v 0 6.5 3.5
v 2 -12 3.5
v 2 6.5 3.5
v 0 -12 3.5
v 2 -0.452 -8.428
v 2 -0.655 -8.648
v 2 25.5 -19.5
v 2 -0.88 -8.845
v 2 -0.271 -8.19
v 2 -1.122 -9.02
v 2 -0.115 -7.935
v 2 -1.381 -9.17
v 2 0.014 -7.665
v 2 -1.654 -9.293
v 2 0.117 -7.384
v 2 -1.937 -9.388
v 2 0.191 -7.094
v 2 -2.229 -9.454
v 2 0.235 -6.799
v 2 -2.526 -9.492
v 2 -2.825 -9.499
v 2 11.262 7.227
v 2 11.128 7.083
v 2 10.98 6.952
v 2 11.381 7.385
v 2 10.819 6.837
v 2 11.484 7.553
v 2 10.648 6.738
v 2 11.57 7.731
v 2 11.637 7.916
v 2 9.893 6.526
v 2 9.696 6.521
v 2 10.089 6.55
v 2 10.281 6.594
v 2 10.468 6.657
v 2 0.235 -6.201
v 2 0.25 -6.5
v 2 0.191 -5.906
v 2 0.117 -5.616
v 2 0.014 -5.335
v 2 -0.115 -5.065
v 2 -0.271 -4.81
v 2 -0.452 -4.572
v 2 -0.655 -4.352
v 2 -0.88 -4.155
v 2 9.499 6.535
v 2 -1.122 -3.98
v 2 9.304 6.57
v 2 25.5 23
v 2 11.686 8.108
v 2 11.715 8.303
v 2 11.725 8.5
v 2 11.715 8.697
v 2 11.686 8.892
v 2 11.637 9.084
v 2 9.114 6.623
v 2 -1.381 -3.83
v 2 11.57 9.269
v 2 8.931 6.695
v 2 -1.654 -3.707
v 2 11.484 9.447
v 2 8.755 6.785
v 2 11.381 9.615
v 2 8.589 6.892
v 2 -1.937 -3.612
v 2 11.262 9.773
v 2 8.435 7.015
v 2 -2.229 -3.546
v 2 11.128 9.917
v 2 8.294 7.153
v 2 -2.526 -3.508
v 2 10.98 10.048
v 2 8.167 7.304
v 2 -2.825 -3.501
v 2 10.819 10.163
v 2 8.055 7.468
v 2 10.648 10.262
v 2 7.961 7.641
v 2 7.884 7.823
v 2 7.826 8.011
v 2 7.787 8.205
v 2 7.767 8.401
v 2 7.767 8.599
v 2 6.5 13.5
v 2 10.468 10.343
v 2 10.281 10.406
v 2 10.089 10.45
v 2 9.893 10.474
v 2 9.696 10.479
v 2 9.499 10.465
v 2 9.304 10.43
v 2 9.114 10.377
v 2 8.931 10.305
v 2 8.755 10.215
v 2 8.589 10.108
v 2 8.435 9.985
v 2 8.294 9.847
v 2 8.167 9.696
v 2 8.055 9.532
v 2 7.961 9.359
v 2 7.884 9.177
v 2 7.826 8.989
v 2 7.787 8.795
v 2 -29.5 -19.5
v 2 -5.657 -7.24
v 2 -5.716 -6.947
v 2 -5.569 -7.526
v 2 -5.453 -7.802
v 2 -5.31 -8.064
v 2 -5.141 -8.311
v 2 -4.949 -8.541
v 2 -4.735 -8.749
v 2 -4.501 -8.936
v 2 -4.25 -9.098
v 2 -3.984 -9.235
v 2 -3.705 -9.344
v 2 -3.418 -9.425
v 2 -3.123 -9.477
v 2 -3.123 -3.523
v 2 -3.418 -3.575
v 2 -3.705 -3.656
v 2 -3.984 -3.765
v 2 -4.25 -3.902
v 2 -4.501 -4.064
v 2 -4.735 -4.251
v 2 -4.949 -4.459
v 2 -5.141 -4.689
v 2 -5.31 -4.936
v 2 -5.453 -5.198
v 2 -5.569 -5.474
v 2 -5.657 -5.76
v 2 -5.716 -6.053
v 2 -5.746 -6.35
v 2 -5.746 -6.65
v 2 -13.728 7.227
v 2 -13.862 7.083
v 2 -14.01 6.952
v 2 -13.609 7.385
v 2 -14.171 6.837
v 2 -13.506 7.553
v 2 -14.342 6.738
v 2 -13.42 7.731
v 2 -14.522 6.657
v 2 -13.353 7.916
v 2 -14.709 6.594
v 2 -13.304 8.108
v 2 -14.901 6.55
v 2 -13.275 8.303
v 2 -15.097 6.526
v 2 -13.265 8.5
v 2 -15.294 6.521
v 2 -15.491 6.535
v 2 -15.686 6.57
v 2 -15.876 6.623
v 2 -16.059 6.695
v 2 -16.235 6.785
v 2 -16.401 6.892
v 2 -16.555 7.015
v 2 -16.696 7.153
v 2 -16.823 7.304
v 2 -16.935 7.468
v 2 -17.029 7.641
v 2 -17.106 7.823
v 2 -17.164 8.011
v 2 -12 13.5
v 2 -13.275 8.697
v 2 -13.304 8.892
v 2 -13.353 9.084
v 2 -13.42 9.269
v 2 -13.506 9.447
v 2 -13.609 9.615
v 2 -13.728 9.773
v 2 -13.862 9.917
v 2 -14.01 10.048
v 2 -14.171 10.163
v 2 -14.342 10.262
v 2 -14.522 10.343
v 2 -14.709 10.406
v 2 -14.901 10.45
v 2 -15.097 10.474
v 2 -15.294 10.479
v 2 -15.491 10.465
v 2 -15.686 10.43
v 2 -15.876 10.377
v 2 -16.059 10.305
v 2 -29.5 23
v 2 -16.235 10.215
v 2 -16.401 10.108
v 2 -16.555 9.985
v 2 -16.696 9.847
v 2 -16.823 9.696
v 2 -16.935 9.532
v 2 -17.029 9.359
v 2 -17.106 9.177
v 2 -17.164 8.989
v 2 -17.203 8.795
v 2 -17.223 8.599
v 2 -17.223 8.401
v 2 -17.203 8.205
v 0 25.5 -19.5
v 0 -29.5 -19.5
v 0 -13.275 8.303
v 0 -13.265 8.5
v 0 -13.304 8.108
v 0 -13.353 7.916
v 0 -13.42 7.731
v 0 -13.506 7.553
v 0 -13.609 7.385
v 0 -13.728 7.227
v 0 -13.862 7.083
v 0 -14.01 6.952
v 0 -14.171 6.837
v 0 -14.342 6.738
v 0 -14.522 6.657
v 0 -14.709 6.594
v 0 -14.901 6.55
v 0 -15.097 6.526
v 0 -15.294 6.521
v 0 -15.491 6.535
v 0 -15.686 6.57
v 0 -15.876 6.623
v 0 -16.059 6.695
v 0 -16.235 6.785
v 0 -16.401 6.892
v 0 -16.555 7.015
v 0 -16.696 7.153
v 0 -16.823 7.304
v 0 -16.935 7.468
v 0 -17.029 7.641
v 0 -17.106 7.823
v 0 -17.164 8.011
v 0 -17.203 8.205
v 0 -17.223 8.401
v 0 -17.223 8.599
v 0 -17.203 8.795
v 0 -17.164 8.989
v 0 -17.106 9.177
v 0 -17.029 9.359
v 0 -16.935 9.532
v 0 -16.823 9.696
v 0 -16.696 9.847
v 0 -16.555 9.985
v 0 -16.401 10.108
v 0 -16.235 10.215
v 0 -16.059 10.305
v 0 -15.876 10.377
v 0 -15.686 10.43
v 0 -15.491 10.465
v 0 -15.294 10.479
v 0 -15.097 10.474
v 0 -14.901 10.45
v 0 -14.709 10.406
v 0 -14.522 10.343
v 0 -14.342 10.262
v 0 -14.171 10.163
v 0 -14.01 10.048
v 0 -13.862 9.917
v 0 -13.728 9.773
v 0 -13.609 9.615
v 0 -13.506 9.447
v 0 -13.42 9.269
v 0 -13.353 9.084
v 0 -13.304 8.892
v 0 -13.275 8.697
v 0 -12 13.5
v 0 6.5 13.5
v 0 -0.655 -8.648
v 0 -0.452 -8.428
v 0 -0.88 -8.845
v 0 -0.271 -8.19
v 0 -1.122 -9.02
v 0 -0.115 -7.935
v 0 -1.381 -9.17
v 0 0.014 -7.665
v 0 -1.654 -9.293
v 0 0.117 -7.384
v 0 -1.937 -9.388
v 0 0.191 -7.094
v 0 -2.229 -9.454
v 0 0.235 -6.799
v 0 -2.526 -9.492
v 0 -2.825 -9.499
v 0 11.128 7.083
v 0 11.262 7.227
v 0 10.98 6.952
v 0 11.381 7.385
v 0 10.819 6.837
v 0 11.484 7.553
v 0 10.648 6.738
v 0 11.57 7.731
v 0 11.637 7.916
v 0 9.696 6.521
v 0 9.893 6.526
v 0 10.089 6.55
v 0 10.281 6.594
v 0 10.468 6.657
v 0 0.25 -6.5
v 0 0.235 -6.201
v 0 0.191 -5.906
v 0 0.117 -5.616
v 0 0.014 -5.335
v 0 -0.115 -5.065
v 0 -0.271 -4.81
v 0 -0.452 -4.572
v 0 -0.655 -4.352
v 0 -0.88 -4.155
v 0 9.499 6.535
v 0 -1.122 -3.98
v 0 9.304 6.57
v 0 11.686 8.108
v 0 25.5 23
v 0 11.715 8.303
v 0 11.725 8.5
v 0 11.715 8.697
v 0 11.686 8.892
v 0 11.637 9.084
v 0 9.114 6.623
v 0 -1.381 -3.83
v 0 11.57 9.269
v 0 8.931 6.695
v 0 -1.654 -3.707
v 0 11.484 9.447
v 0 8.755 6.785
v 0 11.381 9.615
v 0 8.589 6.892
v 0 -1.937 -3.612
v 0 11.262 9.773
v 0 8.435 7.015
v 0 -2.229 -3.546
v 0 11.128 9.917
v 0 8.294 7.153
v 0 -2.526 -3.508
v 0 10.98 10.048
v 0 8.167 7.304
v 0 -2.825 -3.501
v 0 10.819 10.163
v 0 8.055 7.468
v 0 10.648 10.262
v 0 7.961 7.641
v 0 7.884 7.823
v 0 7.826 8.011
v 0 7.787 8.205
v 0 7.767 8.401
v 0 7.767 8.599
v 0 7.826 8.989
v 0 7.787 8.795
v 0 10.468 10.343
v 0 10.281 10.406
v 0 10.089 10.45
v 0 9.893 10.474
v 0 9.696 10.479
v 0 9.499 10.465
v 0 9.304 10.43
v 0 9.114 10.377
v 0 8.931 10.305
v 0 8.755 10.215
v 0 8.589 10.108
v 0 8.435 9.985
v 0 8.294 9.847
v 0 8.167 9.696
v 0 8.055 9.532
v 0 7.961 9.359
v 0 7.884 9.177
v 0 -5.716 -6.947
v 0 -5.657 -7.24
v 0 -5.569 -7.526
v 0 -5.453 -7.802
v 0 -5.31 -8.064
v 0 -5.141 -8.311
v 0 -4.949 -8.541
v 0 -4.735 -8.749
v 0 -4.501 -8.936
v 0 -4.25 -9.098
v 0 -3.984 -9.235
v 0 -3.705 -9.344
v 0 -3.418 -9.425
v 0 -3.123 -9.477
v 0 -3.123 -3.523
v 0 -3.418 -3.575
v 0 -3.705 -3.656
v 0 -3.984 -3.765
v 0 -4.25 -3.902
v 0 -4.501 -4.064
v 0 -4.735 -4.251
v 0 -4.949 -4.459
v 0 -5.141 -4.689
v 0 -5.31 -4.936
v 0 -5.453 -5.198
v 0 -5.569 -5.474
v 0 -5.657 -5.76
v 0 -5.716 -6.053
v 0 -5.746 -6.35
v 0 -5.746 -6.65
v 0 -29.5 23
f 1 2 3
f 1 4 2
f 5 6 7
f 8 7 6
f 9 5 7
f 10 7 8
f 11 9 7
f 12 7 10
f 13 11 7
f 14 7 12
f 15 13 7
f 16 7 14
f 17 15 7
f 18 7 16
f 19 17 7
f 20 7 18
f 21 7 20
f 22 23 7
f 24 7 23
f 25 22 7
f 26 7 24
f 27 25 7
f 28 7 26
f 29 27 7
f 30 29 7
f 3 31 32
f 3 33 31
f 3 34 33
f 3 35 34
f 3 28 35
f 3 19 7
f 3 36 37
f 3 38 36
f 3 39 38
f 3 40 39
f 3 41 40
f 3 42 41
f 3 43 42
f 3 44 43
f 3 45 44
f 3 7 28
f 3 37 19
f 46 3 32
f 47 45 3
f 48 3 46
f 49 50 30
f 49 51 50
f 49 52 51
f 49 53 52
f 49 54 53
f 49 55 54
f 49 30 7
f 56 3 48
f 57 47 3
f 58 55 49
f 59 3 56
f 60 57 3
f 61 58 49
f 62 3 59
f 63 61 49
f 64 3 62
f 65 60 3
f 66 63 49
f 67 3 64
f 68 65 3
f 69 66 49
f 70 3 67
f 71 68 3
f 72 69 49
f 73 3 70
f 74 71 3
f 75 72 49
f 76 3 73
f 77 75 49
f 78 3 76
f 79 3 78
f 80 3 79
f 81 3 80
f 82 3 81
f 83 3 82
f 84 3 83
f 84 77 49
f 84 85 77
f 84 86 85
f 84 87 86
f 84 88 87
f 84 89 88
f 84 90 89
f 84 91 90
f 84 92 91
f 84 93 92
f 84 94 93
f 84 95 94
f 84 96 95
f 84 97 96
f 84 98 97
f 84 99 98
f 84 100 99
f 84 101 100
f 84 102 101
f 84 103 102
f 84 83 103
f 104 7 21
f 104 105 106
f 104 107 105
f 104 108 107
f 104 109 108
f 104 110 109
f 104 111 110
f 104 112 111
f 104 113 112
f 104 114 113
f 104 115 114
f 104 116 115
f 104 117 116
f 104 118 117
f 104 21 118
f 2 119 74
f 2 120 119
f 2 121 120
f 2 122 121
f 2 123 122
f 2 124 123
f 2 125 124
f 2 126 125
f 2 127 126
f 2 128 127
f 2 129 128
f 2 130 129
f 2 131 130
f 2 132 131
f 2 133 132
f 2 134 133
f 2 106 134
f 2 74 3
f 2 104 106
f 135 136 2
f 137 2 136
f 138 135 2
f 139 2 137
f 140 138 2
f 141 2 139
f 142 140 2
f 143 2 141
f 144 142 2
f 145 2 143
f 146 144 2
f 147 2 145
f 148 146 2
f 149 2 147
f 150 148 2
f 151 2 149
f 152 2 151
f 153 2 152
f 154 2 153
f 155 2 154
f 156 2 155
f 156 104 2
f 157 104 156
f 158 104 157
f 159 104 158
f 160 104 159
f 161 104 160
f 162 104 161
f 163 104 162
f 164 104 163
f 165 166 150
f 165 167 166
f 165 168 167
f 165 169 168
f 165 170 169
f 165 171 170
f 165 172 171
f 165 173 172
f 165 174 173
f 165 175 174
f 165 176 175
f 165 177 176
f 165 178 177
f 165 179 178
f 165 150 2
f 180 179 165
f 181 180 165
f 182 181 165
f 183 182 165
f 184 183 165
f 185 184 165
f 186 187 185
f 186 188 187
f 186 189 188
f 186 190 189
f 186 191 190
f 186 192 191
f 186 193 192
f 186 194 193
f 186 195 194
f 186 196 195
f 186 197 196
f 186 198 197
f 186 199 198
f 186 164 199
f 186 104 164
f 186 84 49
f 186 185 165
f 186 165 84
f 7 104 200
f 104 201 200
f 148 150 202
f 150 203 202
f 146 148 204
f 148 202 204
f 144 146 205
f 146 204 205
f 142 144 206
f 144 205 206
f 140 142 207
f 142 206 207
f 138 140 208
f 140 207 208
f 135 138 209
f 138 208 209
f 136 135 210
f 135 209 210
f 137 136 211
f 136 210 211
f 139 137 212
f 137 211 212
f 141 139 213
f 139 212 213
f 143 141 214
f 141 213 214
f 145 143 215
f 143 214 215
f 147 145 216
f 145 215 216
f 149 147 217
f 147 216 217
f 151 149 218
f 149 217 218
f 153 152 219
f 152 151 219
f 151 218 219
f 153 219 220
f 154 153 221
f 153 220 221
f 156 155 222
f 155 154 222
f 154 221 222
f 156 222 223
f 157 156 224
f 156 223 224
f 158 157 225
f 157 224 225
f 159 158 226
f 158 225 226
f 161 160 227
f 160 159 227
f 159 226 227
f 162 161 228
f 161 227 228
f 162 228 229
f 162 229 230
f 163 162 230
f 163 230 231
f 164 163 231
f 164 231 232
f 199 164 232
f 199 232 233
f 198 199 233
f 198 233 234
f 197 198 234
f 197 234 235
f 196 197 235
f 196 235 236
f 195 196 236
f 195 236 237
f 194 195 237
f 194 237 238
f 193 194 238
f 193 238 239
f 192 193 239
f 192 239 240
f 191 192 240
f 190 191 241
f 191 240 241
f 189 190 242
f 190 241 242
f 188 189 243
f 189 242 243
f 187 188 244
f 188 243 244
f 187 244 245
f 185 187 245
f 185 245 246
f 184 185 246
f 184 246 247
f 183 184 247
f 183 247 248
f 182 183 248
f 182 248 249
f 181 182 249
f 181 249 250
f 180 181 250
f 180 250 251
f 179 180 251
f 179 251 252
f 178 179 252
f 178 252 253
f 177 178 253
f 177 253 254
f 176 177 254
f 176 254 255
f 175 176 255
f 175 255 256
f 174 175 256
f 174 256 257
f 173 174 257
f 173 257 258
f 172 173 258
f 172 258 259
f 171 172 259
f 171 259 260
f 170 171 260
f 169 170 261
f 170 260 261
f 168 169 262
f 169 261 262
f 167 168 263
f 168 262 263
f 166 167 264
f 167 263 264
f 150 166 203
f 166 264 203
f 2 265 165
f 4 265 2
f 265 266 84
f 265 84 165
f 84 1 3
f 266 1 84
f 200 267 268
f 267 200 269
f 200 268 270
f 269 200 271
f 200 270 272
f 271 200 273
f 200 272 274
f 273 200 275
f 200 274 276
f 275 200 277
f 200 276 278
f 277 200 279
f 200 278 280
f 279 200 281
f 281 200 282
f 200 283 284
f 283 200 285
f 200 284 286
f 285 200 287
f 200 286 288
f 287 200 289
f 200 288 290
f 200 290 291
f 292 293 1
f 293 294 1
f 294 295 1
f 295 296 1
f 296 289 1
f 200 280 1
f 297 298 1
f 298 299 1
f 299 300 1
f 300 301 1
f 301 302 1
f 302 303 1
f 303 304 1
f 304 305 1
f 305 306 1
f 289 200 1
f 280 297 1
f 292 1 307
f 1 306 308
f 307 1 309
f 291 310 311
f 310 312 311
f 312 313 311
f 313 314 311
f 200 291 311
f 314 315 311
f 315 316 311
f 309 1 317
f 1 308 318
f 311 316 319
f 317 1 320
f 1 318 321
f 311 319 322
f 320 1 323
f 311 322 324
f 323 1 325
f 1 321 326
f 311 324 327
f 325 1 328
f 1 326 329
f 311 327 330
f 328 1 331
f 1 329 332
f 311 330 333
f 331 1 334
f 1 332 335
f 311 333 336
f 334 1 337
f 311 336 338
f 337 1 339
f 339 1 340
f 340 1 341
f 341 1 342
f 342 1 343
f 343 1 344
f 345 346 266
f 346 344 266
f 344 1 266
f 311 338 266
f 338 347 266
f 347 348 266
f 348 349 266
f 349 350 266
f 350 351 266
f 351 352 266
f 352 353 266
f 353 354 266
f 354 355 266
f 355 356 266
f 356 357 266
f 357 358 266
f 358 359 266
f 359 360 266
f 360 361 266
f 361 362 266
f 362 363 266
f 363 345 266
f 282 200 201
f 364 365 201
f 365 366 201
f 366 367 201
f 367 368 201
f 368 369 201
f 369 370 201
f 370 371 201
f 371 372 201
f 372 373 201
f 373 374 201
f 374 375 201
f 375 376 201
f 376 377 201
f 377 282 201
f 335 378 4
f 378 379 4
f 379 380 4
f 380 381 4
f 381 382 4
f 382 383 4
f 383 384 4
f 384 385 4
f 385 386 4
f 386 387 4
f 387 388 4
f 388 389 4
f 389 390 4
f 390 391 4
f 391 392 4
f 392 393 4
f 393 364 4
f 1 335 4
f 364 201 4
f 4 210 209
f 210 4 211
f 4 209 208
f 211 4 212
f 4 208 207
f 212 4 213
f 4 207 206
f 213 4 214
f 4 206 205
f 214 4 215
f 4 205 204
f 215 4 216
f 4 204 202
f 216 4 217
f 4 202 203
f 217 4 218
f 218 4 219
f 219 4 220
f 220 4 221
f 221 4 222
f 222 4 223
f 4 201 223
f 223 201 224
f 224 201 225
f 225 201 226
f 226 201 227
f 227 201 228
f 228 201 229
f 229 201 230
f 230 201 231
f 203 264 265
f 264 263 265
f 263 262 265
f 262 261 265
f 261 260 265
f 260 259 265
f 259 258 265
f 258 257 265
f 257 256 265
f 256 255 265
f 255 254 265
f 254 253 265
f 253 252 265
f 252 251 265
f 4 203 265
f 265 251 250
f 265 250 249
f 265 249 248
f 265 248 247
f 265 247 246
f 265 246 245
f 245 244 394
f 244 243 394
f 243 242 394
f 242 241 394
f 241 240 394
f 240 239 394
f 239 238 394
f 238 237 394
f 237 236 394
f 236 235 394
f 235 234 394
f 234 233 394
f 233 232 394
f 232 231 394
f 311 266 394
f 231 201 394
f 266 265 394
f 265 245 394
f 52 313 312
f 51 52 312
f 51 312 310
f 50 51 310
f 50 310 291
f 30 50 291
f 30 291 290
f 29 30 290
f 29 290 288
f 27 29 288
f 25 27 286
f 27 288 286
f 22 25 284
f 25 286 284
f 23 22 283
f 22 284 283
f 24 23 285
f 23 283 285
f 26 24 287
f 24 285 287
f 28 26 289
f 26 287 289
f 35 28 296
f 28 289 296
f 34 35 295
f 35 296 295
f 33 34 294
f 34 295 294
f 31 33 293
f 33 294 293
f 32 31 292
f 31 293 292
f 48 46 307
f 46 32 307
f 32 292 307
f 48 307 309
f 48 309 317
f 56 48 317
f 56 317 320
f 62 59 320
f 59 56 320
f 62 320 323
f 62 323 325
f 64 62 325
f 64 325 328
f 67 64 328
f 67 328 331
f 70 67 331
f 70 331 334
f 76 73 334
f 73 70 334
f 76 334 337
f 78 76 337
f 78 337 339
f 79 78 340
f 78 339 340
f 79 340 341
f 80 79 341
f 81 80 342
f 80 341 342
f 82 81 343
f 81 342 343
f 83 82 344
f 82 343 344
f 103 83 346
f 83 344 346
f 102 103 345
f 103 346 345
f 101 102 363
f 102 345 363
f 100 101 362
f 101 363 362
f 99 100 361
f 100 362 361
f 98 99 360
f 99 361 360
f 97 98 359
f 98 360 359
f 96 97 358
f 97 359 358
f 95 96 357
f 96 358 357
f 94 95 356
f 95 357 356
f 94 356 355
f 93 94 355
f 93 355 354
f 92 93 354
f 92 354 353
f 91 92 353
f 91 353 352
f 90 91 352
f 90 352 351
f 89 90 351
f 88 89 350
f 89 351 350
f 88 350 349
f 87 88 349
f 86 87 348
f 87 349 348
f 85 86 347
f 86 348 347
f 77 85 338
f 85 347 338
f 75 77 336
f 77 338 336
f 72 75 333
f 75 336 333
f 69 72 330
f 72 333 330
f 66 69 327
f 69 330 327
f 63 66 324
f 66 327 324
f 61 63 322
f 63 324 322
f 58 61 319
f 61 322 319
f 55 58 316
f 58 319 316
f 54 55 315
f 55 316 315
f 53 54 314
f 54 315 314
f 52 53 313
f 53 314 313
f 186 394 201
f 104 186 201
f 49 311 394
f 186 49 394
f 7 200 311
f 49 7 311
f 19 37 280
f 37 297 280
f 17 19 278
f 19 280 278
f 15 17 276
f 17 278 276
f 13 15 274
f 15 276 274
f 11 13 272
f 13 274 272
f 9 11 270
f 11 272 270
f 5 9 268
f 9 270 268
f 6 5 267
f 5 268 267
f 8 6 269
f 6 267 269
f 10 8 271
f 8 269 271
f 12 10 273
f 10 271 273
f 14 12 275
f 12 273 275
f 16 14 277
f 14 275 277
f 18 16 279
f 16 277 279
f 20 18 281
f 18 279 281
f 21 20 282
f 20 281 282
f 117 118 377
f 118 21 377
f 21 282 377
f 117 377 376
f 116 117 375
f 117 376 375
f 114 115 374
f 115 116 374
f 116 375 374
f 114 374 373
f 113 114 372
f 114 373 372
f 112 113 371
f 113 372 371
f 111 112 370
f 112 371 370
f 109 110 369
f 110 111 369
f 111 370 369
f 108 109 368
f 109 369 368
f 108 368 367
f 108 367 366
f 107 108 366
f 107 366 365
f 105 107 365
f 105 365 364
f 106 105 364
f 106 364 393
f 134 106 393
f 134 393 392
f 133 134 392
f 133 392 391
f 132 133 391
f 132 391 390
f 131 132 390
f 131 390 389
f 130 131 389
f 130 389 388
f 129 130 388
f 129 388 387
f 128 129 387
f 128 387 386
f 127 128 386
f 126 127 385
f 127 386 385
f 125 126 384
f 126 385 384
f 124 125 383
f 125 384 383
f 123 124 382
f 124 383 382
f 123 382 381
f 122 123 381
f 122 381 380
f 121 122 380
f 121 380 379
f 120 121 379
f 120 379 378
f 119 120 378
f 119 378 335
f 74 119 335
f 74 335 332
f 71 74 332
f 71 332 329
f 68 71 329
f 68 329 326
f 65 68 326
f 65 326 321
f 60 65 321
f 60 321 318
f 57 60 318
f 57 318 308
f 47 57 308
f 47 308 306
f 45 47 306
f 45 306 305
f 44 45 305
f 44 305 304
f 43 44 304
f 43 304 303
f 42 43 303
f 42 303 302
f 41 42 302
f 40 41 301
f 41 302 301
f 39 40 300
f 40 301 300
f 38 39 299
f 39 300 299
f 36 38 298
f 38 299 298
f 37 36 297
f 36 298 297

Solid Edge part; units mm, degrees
sketch "Sketch1" plane through (0, 0, 0) normal (1, 0, 0) x (0, 1, 0)
  line L0 (25.5, -19.5) -> (25.5, 23)
  line L1 (25.5, 23) -> (-29.5, 23)
  line L2 (-29.5, 23) -> (-29.5, -19.5)
  line L3 (-29.5, -19.5) -> (25.5, -19.5)
extrude "Protrusion1" add sketch "Sketch1" along normal blind 2
sketch "Sketch2" plane through (0, 0, 0) normal (1, 0, 0) x (0, 1, 0)
  line L0 (6.5, 13.5) -> (-12, 13.5)
  line L1 (-12, 13.5) -> (-12, 3.5)
  line L2 (-12, 3.5) -> (6.5, 3.5)
  line L3 (6.5, 3.5) -> (6.5, 13.5)
  circle A0 centre (-15.245, 8.5) radius 1.98
  circle A1 centre (9.745, 8.5) radius 1.98
  dimension "D1" = 18.5
  dimension "D2" = 10
  dimension "D3" = 3.96
  dimension "D4" = 3.96
  dimension "D5" = 3.245
  dimension "D6" = 3.245
  dimension "D7" = 24.99
  dimension "D8" = 23
  dimension "D9" = 28
  dimension "D10" = 28
  dimension "D11" = 19
extrude "ExtrudedCutout_9" cut sketch "Sketch2" along normal blind 2
sketch "Sketch3" plane through (0, 0, 0) normal (1, 0, 0) x (0, 1, 0)
  circle A0 centre (-2.75, -6.5) radius 3
extrude "ExtrudedCutout_10" cut sketch "Sketch3" along normal blind 2
properties material "ABS Plastic, high impact"
